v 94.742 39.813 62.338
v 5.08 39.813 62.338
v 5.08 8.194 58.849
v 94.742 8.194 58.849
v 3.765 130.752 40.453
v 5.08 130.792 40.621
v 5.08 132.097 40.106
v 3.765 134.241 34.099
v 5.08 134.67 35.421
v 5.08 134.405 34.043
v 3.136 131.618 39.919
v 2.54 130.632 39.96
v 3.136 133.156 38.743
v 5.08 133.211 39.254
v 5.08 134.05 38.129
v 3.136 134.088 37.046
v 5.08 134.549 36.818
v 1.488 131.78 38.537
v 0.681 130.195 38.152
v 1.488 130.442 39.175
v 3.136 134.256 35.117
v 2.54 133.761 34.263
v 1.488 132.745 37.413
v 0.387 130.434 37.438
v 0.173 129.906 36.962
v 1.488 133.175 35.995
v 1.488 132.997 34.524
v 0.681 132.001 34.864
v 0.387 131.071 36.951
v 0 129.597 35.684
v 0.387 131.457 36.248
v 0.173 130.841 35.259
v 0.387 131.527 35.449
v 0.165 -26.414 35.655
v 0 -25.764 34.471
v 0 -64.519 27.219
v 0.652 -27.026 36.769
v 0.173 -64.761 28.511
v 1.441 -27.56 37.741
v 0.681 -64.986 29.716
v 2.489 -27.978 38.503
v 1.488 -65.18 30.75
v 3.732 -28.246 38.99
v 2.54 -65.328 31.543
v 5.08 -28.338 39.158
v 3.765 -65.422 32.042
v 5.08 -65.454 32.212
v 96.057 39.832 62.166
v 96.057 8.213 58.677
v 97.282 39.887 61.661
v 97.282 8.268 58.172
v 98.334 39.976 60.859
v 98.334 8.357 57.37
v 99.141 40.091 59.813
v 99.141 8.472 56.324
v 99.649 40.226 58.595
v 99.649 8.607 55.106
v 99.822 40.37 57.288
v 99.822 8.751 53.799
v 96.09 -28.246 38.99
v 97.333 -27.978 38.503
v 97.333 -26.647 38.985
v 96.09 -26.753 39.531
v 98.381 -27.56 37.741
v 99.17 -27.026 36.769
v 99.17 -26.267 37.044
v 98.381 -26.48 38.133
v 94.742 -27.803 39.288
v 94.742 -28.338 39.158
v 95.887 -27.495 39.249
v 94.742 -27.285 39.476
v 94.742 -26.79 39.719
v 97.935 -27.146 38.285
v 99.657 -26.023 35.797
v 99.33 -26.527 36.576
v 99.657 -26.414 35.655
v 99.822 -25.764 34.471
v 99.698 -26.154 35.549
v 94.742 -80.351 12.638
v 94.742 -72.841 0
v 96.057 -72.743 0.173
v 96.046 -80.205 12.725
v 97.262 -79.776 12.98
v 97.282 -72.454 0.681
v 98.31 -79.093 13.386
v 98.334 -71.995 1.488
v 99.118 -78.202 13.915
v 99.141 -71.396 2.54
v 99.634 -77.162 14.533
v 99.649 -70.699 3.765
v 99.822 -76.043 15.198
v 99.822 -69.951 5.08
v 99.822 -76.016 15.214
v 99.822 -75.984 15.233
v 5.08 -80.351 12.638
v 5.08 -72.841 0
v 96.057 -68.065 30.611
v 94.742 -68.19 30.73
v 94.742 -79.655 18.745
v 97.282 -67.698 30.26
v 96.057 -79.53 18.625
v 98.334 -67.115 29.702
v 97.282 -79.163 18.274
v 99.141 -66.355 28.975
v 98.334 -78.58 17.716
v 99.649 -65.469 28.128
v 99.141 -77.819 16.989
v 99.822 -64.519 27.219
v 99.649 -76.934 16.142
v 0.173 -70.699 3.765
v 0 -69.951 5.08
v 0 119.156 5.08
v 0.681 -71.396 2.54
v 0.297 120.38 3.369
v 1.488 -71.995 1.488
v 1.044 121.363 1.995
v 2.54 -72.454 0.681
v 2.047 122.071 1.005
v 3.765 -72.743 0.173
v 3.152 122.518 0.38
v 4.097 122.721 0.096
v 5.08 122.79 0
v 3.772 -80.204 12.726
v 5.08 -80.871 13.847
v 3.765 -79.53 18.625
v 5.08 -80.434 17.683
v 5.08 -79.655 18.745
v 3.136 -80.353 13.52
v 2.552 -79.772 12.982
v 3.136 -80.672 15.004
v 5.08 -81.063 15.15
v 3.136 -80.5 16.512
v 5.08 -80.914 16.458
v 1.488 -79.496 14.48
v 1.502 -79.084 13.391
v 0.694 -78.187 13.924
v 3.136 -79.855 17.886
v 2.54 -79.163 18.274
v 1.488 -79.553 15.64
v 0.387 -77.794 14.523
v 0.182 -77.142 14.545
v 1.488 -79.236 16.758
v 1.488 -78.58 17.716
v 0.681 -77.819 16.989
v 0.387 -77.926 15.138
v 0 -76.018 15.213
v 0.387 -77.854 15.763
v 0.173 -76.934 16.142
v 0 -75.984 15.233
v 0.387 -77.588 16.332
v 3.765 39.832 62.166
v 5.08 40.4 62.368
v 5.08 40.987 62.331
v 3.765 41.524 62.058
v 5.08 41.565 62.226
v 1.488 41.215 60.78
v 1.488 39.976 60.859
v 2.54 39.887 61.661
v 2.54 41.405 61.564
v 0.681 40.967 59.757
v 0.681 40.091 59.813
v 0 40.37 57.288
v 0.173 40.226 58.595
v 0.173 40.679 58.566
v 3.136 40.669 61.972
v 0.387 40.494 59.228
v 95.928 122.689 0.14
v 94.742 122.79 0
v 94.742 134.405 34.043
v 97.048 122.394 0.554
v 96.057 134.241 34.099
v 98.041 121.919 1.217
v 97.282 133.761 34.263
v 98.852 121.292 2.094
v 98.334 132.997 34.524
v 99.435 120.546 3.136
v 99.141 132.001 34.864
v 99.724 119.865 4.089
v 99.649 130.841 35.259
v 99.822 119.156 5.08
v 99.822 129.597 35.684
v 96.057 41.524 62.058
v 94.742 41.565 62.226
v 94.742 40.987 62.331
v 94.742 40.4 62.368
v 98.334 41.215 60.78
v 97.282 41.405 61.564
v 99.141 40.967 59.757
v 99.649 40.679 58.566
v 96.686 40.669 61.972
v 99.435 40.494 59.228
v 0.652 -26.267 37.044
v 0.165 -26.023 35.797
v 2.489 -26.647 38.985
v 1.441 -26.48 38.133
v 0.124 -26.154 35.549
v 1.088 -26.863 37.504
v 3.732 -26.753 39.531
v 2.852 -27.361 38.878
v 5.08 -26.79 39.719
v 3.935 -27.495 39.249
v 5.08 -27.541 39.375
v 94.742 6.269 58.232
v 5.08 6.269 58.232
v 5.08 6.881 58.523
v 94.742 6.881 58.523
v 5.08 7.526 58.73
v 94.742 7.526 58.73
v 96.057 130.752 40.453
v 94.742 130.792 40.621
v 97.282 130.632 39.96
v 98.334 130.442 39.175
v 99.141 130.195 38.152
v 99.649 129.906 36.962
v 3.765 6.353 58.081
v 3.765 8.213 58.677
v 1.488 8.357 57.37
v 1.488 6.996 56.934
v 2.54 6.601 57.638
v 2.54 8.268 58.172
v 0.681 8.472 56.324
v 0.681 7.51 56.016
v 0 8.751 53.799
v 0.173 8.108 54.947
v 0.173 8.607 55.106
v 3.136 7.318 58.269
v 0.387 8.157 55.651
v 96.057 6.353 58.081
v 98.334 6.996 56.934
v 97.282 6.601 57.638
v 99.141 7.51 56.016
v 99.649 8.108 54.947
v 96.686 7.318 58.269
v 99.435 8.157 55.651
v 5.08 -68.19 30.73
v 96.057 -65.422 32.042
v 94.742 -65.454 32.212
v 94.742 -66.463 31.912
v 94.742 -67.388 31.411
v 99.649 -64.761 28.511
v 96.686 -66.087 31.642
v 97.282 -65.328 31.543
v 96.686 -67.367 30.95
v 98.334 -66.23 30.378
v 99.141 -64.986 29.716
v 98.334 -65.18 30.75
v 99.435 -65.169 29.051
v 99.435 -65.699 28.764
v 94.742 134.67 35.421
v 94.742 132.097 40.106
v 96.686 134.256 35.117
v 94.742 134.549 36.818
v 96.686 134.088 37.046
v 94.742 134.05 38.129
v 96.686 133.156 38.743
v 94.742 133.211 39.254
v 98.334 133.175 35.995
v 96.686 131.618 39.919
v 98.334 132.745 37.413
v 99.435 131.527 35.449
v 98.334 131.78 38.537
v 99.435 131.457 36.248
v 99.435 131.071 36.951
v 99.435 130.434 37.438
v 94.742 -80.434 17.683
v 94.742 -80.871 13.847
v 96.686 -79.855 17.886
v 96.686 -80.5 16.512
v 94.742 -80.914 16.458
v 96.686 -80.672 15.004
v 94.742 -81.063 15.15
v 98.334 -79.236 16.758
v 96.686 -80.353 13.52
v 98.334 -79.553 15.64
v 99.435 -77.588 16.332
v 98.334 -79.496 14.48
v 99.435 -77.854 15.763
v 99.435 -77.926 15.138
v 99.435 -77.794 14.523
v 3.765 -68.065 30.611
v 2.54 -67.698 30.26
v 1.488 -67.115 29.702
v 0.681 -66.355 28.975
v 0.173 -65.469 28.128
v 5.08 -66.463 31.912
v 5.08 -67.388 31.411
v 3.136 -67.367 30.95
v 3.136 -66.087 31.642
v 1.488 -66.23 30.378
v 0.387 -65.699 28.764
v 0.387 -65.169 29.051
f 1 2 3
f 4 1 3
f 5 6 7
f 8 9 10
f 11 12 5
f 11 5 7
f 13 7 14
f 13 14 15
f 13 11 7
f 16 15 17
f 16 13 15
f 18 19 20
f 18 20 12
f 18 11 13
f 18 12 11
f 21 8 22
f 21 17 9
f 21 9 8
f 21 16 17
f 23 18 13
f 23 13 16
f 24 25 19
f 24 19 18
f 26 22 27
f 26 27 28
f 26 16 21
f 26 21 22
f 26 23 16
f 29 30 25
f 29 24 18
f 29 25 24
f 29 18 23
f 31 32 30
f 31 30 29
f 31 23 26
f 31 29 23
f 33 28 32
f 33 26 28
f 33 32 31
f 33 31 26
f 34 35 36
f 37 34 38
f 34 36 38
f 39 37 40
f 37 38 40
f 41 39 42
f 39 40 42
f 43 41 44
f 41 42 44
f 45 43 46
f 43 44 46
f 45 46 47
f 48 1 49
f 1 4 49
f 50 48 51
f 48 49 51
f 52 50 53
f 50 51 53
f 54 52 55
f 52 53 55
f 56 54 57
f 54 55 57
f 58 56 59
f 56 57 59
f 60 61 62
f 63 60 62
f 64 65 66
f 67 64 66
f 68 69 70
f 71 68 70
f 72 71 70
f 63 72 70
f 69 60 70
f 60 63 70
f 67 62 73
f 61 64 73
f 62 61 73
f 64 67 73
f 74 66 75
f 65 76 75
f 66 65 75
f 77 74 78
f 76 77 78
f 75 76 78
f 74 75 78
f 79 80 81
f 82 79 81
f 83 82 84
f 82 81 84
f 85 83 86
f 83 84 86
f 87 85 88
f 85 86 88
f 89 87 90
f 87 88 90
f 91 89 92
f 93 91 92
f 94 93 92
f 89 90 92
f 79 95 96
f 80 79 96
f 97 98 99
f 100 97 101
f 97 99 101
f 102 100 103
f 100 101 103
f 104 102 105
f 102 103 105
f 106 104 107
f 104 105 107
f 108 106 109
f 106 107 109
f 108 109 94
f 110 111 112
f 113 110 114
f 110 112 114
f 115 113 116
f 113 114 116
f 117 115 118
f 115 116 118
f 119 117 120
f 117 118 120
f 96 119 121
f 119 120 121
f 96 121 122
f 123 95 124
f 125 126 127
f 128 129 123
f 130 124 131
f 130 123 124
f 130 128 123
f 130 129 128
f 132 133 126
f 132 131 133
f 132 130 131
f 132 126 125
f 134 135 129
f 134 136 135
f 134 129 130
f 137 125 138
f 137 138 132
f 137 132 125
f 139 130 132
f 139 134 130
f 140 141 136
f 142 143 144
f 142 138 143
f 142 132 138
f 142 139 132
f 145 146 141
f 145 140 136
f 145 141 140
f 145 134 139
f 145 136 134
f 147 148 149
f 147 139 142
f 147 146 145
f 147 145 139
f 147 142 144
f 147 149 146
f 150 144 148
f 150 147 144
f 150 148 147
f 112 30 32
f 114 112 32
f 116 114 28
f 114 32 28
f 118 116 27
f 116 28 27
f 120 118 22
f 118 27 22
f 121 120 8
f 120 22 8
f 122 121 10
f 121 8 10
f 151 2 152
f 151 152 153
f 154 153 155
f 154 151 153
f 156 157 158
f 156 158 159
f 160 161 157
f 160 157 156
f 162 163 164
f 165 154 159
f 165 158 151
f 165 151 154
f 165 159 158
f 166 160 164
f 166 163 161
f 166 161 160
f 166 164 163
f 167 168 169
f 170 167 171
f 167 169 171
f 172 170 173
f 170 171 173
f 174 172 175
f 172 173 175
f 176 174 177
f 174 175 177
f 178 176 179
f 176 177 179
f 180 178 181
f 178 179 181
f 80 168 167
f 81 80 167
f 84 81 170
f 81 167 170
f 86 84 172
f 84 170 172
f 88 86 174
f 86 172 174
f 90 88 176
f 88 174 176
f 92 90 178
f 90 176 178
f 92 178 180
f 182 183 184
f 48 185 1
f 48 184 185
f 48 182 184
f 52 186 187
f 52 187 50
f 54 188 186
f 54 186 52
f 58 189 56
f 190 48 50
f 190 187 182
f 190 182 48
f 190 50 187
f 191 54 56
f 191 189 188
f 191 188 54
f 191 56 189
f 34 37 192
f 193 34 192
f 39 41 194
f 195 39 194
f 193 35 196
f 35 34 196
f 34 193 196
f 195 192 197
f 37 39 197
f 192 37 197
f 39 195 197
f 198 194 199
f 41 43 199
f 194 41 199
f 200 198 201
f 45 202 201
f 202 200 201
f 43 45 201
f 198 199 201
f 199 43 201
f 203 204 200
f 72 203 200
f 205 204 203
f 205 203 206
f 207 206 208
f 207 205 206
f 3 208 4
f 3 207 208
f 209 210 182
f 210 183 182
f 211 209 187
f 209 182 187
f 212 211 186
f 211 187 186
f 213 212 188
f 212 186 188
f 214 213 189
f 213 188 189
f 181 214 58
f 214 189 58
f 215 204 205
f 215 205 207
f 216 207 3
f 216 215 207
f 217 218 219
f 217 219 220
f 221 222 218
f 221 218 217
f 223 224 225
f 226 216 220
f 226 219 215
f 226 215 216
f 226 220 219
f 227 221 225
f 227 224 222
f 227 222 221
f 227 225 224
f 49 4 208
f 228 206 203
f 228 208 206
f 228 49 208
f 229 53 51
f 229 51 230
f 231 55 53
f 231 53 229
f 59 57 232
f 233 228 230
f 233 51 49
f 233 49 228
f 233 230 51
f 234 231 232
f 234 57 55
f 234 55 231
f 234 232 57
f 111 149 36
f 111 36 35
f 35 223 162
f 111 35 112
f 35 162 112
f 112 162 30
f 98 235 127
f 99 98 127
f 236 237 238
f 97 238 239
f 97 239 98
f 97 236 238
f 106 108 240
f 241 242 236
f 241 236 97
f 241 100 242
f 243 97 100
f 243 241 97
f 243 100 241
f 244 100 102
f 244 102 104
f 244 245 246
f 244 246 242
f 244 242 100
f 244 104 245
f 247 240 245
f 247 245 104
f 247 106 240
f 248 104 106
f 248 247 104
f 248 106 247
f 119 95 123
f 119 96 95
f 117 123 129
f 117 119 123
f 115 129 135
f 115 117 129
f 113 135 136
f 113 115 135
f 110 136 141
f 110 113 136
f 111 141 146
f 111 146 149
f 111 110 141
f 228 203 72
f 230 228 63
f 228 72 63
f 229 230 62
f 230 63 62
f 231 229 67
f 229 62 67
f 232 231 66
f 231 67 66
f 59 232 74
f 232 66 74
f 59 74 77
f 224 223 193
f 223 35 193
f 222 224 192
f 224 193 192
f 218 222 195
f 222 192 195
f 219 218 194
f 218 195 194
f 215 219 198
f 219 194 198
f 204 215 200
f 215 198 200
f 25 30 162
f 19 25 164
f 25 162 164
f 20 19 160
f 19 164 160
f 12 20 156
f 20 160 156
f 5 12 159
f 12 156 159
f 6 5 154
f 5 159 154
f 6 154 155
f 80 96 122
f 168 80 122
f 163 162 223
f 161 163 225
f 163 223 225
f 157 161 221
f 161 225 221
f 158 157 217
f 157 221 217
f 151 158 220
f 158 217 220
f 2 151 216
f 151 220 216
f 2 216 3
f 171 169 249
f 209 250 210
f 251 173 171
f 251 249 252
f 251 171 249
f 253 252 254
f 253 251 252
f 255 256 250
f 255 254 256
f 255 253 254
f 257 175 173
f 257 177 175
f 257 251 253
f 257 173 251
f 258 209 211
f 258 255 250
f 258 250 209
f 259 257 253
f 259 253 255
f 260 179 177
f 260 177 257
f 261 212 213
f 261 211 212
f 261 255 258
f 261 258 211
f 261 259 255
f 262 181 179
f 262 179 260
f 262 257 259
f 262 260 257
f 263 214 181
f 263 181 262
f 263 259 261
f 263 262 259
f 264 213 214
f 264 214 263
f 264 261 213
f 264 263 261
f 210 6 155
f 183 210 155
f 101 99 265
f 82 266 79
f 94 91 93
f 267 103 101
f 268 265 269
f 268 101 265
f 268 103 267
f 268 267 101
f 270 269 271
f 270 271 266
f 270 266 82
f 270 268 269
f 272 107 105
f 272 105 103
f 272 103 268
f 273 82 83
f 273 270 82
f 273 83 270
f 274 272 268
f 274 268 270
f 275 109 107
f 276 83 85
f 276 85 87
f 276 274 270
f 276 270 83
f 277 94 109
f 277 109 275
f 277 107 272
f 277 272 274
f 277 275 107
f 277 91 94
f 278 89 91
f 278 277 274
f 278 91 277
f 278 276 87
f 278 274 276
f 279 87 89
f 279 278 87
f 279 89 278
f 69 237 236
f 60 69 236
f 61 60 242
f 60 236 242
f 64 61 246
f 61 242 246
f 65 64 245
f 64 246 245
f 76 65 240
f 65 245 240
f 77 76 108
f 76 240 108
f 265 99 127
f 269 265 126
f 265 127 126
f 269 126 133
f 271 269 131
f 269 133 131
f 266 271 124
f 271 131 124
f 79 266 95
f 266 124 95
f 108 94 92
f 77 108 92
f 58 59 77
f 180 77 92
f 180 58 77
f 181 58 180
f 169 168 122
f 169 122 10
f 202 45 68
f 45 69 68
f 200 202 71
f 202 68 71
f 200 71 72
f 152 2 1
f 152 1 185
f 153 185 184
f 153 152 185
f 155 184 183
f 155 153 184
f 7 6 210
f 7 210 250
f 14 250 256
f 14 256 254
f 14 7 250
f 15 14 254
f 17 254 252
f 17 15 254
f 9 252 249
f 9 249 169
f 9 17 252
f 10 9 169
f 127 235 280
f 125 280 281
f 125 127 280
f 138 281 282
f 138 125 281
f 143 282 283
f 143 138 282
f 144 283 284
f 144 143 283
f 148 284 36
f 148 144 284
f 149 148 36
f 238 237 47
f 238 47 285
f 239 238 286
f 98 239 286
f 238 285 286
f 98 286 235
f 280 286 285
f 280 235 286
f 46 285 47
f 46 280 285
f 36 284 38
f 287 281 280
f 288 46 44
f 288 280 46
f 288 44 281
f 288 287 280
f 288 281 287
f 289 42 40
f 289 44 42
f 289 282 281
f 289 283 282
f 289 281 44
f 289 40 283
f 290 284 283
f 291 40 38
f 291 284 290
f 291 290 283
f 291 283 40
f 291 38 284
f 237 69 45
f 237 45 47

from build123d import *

# Parameters (mm, degrees)
F1_DEPTH     = 99.822
F2_R         = 5.08
F3_R         = 5.08
F4_F1_R      = 5.08
F4_T2_DEPTH  = 89.662
F4_T7_DEPTH  = 5.1816
F4_T13_DEPTH = 5.1816
F4_T19_DEPTH = 5.1816
F4_T25_DEPTH = 5.1816
F4_T31_DEPTH = 5.1816
F4_T37_DEPTH = 5.1816
F4_T43_DEPTH = 5.1816
F4_T49_DEPTH = 5.1816
F4_T55_DEPTH = 5.1816
F4_T61_DEPTH = 5.1816


# Not quite as in the source:
# - a fillet or chamfer that OpenCascade refuses, or shapes differently, is made with other operations: its cross-section is extruded or revolved along the edge and cut away or added


with BuildPart() as f1:
    # F0 (on Right) → F1 (new body)
    with BuildSketch(Plane.YZ):
        Polygon((-82.3224335909, 15.9557517618), (-72.8414729238, 0), (122.7899119258, 0), (136.201992631, 39.3112748861), (40.6987294555, 62.4355487525), (7.1685267612, 58.7356649339), (-27.5178905576, 39.3112748861), (-67.0604035258, 31.9115035236), align=None)
    extrude(amount=F1_DEPTH)

    # F2
    f2_edges = [f1.edges().sort_by_distance(p)[0] for p in [
        (99.822, -47.289147, 35.611389),
        (99.822, -74.691419, 23.933628),
        (99.822, -77.581953, 7.977876),
        (99.822, 24.97422, 0),
        (99.822, 129.495952, 19.655637),
        (99.822, 88.450361, 50.873412),
        (99.822, 23.933628, 60.585607),
        (99.822, -10.174682, 49.02347),
    ]]
    fillet(f2_edges, radius=F2_R)

    # F3
    f3_edges = [f1.edges().sort_by_distance(p)[0] for p in [
        (0, -47.289147, 35.611389),
        (0, -74.691419, 23.933628),
        (0, -77.581953, 7.977876),
        (0, 24.97422, 0),
        (0, 129.495952, 19.655637),
        (0, 88.450361, 50.873412),
        (0, 23.933628, 60.585607),
        (0, -10.174682, 49.02347),
    ]]
    fillet(f3_edges, radius=F3_R)

    # F4: fillet of radius 5.08 on 8 edges, made by hand

    # F4_f1
    f4_f1_edges = [f1.edges().sort_by_distance(p)[0] for p in [
        (49.911, -27.5178905576, 39.3112748861),
        (1.4878975516, -27.0040618743, 37.8937040228),
        (98.3341025696, -27.0040618325, 37.8937039074),
    ]]
    fillet(f4_f1_edges, radius=F4_F1_R)

    # F4_s3 → F4_t2 (cut)
    with BuildSketch(Plane.YZ.offset(5.08)):
        with BuildLine():
            ThreePointArc((-65.453685614, 32.2121759973), (-66.9382582043, 31.6859414336), (-68.1902824988, 30.7302669295))
            Line((-68.1902824988, 30.7302669295), (-68.2637028962, 30.8004951663))
            Line((-68.2637028962, 30.8004951663), (-67.1112263438, 32.0053564923))
            Line((-67.1112263438, 32.0053564923), (-65.4723740737, 32.3120424155))
            Line((-65.4723740737, 32.3120424155), (-65.453685614, 32.2121759973))
        make_face()
        with BuildLine():
            ThreePointArc((-79.6549091873, 18.7445260612), (-81.0311938802, 15.8085415748), (-80.3510820874, 12.6381137788))
            Line((-80.3510820874, 12.6381137788), (-80.4384259429, 12.5862137699))
            Line((-80.4384259429, 12.5862137699), (-82.4492044764, 15.9702045126))
            Line((-82.4492044764, 15.9702045126), (-79.7283295848, 18.8147542979))
            Line((-79.7283295848, 18.8147542979), (-79.6549091873, 18.7445260612))
        make_face()
        with BuildLine():
            ThreePointArc((6.2686920086, 58.2317575672), (7.2001593092, 58.6369802666), (8.1936269176, 58.8487794151))
            Line((8.1936269176, 58.8487794151), (8.1824835206, 58.9497664672))
            Line((8.1824835206, 58.9497664672), (7.1368813611, 58.8343896965))
            Line((7.1368813611, 58.8343896965), (6.2190499134, 58.3204041823))
            Line((6.2190499134, 58.3204041823), (6.2686920086, 58.2317575672))
        make_face()
        with BuildLine():
            ThreePointArc((39.8125749839, 62.3377662065), (40.6937772364, 62.3580687153), (41.5652241428, 62.2257437701))
            Line((41.5652241428, 62.2257437701), (41.589133729, 62.3244903735))
            Line((41.589133729, 62.3244903735), (40.7053091479, 62.5384914556))
            Line((40.7053091479, 62.5384914556), (39.8014315869, 62.4387532586))
            Line((39.8014315869, 62.4387532586), (39.8125749839, 62.3377662065))
        make_face()
        with BuildLine():
            ThreePointArc((130.792336403, 40.6211188431), (134.0495526612, 38.1291725243), (134.4047361425, 34.0434536277))
            Line((134.4047361425, 34.0434536277), (134.5008937235, 34.0106469268))
            Line((134.5008937235, 34.0106469268), (136.3340953417, 39.3838246104))
            Line((136.3340953417, 39.3838246104), (130.8162459892, 40.7198654465))
            Line((130.8162459892, 40.7198654465), (130.792336403, 40.6211188431))
        make_face()
    extrude(amount=F4_T2_DEPTH, mode=Mode.SUBTRACT)


with BuildPart() as f4_tool5:
    # F4_s6 → F4_t7 (new body)
    with BuildSketch(Plane.YZ.offset(5.08)):
        Polygon((129.5968570941, 35.6837886716), (130.8162459892, 40.7198654465), (136.3340953417, 39.3838246104), (134.5008937235, 34.0106469268), align=None)
    extrude(amount=-F4_T7_DEPTH)

    # F4_s8 → F4_t9 (revolve, cut)
    with BuildSketch(Plane(origin=(5.08, 129.5968570941, 35.6837886716), x_dir=(0, -0.8765148754, -0.4813747742), z_dir=(0, 0.4813747742, -0.8765148754))):
        with BuildLine():
            ThreePointArc((0, -5.08), (5.08, 0), (0, 5.08))
            Line((0, 5.08), (0, -5.08))
        make_face()
    revolve(axis=Axis((5.08, 129.5968570941, 35.6837886716), (-1, 0, 0)), mode=Mode.SUBTRACT)


with BuildPart() as f1_1:
    add(f1.part)

    # F4_t4: cut F4_tool5
    add(f4_tool5.part, mode=Mode.SUBTRACT)


with BuildPart() as f4_tool11:
    # F4_s12 → F4_t13 (new body)
    with BuildSketch(Plane.YZ.offset(94.742)):
        Polygon((129.5968570941, 35.6837886716), (130.8162459892, 40.7198654465), (136.3340953417, 39.3838246104), (134.5008937235, 34.0106469268), align=None)
    extrude(amount=F4_T13_DEPTH)

    # F4_s14 → F4_t15 (revolve, cut)
    with BuildSketch(Plane(origin=(94.742, 129.5968570941, 35.6837886716), x_dir=(0, -0.8765148754, -0.4813747742), z_dir=(0, -0.4813747742, 0.8765148754))):
        with BuildLine():
            ThreePointArc((0, -5.08), (5.08, 0), (0, 5.08))
            Line((0, 5.08), (0, -5.08))
        make_face()
    revolve(axis=Axis((94.742, 129.5968570941, 35.6837886716), (1, 0, 0)), mode=Mode.SUBTRACT)


with BuildPart() as f1_2:
    add(f1_1.part)

    # F4_t10: cut F4_tool11
    add(f4_tool11.part, mode=Mode.SUBTRACT)


with BuildPart() as f4_tool17:
    # F4_s18 → F4_t19 (new body)
    with BuildSketch(Plane.YZ.offset(5.08)):
        Polygon((40.369744834, 57.2884135986), (39.8014315869, 62.4387532586), (40.7053091479, 62.5384914556), (41.589133729, 62.3244903735), align=None)
    extrude(amount=-F4_T19_DEPTH)

    # F4_s20 → F4_t21 (revolve, cut)
    with BuildSketch(Plane(origin=(5.08, 40.369744834, 57.2884135986), x_dir=(0, -0.063785906, -0.9979636056), z_dir=(0, 0.9979636056, -0.063785906))):
        with BuildLine():
            ThreePointArc((0, -5.08), (5.08, 0), (0, 5.08))
            Line((0, 5.08), (0, -5.08))
        make_face()
    revolve(axis=Axis((5.08, 40.369744834, 57.2884135986), (-1, 0, 0)), mode=Mode.SUBTRACT)


with BuildPart() as f1_3:
    add(f1_2.part)

    # F4_t16: cut F4_tool17
    add(f4_tool17.part, mode=Mode.SUBTRACT)


with BuildPart() as f4_tool23:
    # F4_s24 → F4_t25 (new body)
    with BuildSketch(Plane.YZ.offset(94.742)):
        Polygon((40.369744834, 57.2884135986), (39.8014315869, 62.4387532586), (40.7053091479, 62.5384914556), (41.589133729, 62.3244903735), align=None)
    extrude(amount=F4_T25_DEPTH)

    # F4_s26 → F4_t27 (revolve, cut)
    with BuildSketch(Plane(origin=(94.742, 40.369744834, 57.2884135986), x_dir=(0, -0.063785906, -0.9979636056), z_dir=(0, -0.9979636056, 0.063785906))):
        with BuildLine():
            ThreePointArc((0, -5.08), (5.08, 0), (0, 5.08))
            Line((0, 5.08), (0, -5.08))
        make_face()
    revolve(axis=Axis((94.742, 40.369744834, 57.2884135986), (1, 0, 0)), mode=Mode.SUBTRACT)


with BuildPart() as f1_4:
    add(f1_3.part)

    # F4_t22: cut F4_tool23
    add(f4_tool23.part, mode=Mode.SUBTRACT)


with BuildPart() as f4_tool29:
    # F4_s30 → F4_t31 (new body)
    with BuildSketch(Plane.YZ.offset(5.08)):
        Polygon((8.7507967676, 53.7994268073), (6.2190499134, 58.3204041823), (7.1368813611, 58.8343896965), (8.1824835206, 58.9497664672), align=None)
    extrude(amount=-F4_T31_DEPTH)

    # F4_s32 → F4_t33 (revolve, cut)
    with BuildSketch(Plane(origin=(5.08, 8.7507967676, 53.7994268073), x_dir=(0, 0.3052435942, -0.952274303), z_dir=(0, 0.952274303, 0.3052435942))):
        with BuildLine():
            ThreePointArc((0, -5.08), (5.08, 0), (0, 5.08))
            Line((0, 5.08), (0, -5.08))
        make_face()
    revolve(axis=Axis((5.08, 8.7507967676, 53.7994268073), (-1, 0, 0)), mode=Mode.SUBTRACT)


with BuildPart() as f1_5:
    add(f1_4.part)

    # F4_t28: cut F4_tool29
    add(f4_tool29.part, mode=Mode.SUBTRACT)


with BuildPart() as f4_tool35:
    # F4_s36 → F4_t37 (new body)
    with BuildSketch(Plane.YZ.offset(94.742)):
        Polygon((8.7507967676, 53.7994268073), (6.2190499134, 58.3204041823), (7.1368813611, 58.8343896965), (8.1824835206, 58.9497664672), align=None)
    extrude(amount=F4_T37_DEPTH)

    # F4_s38 → F4_t39 (revolve, cut)
    with BuildSketch(Plane(origin=(94.742, 8.7507967676, 53.7994268073), x_dir=(0, 0.3052435942, -0.952274303), z_dir=(0, -0.952274303, -0.3052435942))):
        with BuildLine():
            ThreePointArc((0, -5.08), (5.08, 0), (0, 5.08))
            Line((0, 5.08), (0, -5.08))
        make_face()
    revolve(axis=Axis((94.742, 8.7507967676, 53.7994268073), (1, 0, 0)), mode=Mode.SUBTRACT)


with BuildPart() as f1_6:
    add(f1_5.part)

    # F4_t34: cut F4_tool35
    add(f4_tool35.part, mode=Mode.SUBTRACT)


with BuildPart() as f4_tool41:
    # F4_s42 → F4_t43 (new body)
    with BuildSketch(Plane.YZ.offset(5.08)):
        Polygon((-75.9838893162, 15.2331142218), (-79.7283295848, 18.8147542979), (-82.4492044764, 15.9702045126), (-80.4384259429, 12.5862137699), align=None)
    extrude(amount=-F4_T43_DEPTH)

    # F4_s44 → F4_t45 (revolve, cut)
    with BuildSketch(Plane(origin=(5.08, -75.9838893162, 15.2331142218), x_dir=(0, 0.9935638905, -0.113273101), z_dir=(0, 0.113273101, 0.9935638905))):
        with BuildLine():
            ThreePointArc((0, -5.08), (5.08, 0), (0, 5.08))
            Line((0, 5.08), (0, -5.08))
        make_face()
    revolve(axis=Axis((5.08, -75.9838893162, 15.2331142218), (-1, 0, 0)), mode=Mode.SUBTRACT)


with BuildPart() as f1_7:
    add(f1_6.part)

    # F4_t40: cut F4_tool41
    add(f4_tool41.part, mode=Mode.SUBTRACT)


with BuildPart() as f4_tool47:
    # F4_s48 → F4_t49 (new body)
    with BuildSketch(Plane.YZ.offset(94.742)):
        Polygon((-75.9838893162, 15.2331142218), (-79.7283295848, 18.8147542979), (-82.4492044764, 15.9702045126), (-80.4384259429, 12.5862137699), align=None)
    extrude(amount=F4_T49_DEPTH)

    # F4_s50 → F4_t51 (revolve, cut)
    with BuildSketch(Plane(origin=(94.742, -75.9838893162, 15.2331142218), x_dir=(0, 0.9935638905, -0.113273101), z_dir=(0, -0.113273101, -0.9935638905))):
        with BuildLine():
            ThreePointArc((0, -5.08), (5.08, 0), (0, 5.08))
            Line((0, 5.08), (0, -5.08))
        make_face()
    revolve(axis=Axis((94.742, -75.9838893162, 15.2331142218), (1, 0, 0)), mode=Mode.SUBTRACT)


with BuildPart() as f1_8:
    add(f1_7.part)

    # F4_t46: cut F4_tool47
    add(f4_tool47.part, mode=Mode.SUBTRACT)


with BuildPart() as f4_tool53:
    # F4_s54 → F4_t55 (new body)
    with BuildSketch(Plane.YZ.offset(5.08)):
        Polygon((-64.5192626277, 27.2188550901), (-65.4723740737, 32.3120424155), (-67.1112263438, 32.0053564923), (-68.2637028962, 30.8004951663), align=None)
    extrude(amount=-F4_T55_DEPTH)

    # F4_s56 → F4_t57 (revolve, cut)
    with BuildSketch(Plane(origin=(5.08, -64.5192626277, 27.2188550901), x_dir=(0, 0.4761802316, -0.8793477054), z_dir=(0, 0.8793477054, 0.4761802316))):
        with BuildLine():
            ThreePointArc((0, -5.08), (5.08, 0), (0, 5.08))
            Line((0, 5.08), (0, -5.08))
        make_face()
    revolve(axis=Axis((5.08, -64.5192626277, 27.2188550901), (-1, 0, 0)), mode=Mode.SUBTRACT)


with BuildPart() as f1_9:
    add(f1_8.part)

    # F4_t52: cut F4_tool53
    add(f4_tool53.part, mode=Mode.SUBTRACT)


with BuildPart() as f4_tool59:
    # F4_s60 → F4_t61 (new body)
    with BuildSketch(Plane.YZ.offset(94.742)):
        Polygon((-64.5192626277, 27.2188550901), (-65.4723740737, 32.3120424155), (-67.1112263438, 32.0053564923), (-68.2637028962, 30.8004951663), align=None)
    extrude(amount=F4_T61_DEPTH)

    # F4_s62 → F4_t63 (revolve, cut)
    with BuildSketch(Plane(origin=(94.742, -64.5192626277, 27.2188550901), x_dir=(0, 0.4761802316, -0.8793477054), z_dir=(0, -0.8793477054, -0.4761802316))):
        with BuildLine():
            ThreePointArc((0, -5.08), (5.08, 0), (0, 5.08))
            Line((0, 5.08), (0, -5.08))
        make_face()
    revolve(axis=Axis((94.742, -64.5192626277, 27.2188550901), (1, 0, 0)), mode=Mode.SUBTRACT)


with BuildPart() as f1_10:
    add(f1_9.part)

    # F4_t58: cut F4_tool59
    add(f4_tool59.part, mode=Mode.SUBTRACT)


solid = f1_10.part
